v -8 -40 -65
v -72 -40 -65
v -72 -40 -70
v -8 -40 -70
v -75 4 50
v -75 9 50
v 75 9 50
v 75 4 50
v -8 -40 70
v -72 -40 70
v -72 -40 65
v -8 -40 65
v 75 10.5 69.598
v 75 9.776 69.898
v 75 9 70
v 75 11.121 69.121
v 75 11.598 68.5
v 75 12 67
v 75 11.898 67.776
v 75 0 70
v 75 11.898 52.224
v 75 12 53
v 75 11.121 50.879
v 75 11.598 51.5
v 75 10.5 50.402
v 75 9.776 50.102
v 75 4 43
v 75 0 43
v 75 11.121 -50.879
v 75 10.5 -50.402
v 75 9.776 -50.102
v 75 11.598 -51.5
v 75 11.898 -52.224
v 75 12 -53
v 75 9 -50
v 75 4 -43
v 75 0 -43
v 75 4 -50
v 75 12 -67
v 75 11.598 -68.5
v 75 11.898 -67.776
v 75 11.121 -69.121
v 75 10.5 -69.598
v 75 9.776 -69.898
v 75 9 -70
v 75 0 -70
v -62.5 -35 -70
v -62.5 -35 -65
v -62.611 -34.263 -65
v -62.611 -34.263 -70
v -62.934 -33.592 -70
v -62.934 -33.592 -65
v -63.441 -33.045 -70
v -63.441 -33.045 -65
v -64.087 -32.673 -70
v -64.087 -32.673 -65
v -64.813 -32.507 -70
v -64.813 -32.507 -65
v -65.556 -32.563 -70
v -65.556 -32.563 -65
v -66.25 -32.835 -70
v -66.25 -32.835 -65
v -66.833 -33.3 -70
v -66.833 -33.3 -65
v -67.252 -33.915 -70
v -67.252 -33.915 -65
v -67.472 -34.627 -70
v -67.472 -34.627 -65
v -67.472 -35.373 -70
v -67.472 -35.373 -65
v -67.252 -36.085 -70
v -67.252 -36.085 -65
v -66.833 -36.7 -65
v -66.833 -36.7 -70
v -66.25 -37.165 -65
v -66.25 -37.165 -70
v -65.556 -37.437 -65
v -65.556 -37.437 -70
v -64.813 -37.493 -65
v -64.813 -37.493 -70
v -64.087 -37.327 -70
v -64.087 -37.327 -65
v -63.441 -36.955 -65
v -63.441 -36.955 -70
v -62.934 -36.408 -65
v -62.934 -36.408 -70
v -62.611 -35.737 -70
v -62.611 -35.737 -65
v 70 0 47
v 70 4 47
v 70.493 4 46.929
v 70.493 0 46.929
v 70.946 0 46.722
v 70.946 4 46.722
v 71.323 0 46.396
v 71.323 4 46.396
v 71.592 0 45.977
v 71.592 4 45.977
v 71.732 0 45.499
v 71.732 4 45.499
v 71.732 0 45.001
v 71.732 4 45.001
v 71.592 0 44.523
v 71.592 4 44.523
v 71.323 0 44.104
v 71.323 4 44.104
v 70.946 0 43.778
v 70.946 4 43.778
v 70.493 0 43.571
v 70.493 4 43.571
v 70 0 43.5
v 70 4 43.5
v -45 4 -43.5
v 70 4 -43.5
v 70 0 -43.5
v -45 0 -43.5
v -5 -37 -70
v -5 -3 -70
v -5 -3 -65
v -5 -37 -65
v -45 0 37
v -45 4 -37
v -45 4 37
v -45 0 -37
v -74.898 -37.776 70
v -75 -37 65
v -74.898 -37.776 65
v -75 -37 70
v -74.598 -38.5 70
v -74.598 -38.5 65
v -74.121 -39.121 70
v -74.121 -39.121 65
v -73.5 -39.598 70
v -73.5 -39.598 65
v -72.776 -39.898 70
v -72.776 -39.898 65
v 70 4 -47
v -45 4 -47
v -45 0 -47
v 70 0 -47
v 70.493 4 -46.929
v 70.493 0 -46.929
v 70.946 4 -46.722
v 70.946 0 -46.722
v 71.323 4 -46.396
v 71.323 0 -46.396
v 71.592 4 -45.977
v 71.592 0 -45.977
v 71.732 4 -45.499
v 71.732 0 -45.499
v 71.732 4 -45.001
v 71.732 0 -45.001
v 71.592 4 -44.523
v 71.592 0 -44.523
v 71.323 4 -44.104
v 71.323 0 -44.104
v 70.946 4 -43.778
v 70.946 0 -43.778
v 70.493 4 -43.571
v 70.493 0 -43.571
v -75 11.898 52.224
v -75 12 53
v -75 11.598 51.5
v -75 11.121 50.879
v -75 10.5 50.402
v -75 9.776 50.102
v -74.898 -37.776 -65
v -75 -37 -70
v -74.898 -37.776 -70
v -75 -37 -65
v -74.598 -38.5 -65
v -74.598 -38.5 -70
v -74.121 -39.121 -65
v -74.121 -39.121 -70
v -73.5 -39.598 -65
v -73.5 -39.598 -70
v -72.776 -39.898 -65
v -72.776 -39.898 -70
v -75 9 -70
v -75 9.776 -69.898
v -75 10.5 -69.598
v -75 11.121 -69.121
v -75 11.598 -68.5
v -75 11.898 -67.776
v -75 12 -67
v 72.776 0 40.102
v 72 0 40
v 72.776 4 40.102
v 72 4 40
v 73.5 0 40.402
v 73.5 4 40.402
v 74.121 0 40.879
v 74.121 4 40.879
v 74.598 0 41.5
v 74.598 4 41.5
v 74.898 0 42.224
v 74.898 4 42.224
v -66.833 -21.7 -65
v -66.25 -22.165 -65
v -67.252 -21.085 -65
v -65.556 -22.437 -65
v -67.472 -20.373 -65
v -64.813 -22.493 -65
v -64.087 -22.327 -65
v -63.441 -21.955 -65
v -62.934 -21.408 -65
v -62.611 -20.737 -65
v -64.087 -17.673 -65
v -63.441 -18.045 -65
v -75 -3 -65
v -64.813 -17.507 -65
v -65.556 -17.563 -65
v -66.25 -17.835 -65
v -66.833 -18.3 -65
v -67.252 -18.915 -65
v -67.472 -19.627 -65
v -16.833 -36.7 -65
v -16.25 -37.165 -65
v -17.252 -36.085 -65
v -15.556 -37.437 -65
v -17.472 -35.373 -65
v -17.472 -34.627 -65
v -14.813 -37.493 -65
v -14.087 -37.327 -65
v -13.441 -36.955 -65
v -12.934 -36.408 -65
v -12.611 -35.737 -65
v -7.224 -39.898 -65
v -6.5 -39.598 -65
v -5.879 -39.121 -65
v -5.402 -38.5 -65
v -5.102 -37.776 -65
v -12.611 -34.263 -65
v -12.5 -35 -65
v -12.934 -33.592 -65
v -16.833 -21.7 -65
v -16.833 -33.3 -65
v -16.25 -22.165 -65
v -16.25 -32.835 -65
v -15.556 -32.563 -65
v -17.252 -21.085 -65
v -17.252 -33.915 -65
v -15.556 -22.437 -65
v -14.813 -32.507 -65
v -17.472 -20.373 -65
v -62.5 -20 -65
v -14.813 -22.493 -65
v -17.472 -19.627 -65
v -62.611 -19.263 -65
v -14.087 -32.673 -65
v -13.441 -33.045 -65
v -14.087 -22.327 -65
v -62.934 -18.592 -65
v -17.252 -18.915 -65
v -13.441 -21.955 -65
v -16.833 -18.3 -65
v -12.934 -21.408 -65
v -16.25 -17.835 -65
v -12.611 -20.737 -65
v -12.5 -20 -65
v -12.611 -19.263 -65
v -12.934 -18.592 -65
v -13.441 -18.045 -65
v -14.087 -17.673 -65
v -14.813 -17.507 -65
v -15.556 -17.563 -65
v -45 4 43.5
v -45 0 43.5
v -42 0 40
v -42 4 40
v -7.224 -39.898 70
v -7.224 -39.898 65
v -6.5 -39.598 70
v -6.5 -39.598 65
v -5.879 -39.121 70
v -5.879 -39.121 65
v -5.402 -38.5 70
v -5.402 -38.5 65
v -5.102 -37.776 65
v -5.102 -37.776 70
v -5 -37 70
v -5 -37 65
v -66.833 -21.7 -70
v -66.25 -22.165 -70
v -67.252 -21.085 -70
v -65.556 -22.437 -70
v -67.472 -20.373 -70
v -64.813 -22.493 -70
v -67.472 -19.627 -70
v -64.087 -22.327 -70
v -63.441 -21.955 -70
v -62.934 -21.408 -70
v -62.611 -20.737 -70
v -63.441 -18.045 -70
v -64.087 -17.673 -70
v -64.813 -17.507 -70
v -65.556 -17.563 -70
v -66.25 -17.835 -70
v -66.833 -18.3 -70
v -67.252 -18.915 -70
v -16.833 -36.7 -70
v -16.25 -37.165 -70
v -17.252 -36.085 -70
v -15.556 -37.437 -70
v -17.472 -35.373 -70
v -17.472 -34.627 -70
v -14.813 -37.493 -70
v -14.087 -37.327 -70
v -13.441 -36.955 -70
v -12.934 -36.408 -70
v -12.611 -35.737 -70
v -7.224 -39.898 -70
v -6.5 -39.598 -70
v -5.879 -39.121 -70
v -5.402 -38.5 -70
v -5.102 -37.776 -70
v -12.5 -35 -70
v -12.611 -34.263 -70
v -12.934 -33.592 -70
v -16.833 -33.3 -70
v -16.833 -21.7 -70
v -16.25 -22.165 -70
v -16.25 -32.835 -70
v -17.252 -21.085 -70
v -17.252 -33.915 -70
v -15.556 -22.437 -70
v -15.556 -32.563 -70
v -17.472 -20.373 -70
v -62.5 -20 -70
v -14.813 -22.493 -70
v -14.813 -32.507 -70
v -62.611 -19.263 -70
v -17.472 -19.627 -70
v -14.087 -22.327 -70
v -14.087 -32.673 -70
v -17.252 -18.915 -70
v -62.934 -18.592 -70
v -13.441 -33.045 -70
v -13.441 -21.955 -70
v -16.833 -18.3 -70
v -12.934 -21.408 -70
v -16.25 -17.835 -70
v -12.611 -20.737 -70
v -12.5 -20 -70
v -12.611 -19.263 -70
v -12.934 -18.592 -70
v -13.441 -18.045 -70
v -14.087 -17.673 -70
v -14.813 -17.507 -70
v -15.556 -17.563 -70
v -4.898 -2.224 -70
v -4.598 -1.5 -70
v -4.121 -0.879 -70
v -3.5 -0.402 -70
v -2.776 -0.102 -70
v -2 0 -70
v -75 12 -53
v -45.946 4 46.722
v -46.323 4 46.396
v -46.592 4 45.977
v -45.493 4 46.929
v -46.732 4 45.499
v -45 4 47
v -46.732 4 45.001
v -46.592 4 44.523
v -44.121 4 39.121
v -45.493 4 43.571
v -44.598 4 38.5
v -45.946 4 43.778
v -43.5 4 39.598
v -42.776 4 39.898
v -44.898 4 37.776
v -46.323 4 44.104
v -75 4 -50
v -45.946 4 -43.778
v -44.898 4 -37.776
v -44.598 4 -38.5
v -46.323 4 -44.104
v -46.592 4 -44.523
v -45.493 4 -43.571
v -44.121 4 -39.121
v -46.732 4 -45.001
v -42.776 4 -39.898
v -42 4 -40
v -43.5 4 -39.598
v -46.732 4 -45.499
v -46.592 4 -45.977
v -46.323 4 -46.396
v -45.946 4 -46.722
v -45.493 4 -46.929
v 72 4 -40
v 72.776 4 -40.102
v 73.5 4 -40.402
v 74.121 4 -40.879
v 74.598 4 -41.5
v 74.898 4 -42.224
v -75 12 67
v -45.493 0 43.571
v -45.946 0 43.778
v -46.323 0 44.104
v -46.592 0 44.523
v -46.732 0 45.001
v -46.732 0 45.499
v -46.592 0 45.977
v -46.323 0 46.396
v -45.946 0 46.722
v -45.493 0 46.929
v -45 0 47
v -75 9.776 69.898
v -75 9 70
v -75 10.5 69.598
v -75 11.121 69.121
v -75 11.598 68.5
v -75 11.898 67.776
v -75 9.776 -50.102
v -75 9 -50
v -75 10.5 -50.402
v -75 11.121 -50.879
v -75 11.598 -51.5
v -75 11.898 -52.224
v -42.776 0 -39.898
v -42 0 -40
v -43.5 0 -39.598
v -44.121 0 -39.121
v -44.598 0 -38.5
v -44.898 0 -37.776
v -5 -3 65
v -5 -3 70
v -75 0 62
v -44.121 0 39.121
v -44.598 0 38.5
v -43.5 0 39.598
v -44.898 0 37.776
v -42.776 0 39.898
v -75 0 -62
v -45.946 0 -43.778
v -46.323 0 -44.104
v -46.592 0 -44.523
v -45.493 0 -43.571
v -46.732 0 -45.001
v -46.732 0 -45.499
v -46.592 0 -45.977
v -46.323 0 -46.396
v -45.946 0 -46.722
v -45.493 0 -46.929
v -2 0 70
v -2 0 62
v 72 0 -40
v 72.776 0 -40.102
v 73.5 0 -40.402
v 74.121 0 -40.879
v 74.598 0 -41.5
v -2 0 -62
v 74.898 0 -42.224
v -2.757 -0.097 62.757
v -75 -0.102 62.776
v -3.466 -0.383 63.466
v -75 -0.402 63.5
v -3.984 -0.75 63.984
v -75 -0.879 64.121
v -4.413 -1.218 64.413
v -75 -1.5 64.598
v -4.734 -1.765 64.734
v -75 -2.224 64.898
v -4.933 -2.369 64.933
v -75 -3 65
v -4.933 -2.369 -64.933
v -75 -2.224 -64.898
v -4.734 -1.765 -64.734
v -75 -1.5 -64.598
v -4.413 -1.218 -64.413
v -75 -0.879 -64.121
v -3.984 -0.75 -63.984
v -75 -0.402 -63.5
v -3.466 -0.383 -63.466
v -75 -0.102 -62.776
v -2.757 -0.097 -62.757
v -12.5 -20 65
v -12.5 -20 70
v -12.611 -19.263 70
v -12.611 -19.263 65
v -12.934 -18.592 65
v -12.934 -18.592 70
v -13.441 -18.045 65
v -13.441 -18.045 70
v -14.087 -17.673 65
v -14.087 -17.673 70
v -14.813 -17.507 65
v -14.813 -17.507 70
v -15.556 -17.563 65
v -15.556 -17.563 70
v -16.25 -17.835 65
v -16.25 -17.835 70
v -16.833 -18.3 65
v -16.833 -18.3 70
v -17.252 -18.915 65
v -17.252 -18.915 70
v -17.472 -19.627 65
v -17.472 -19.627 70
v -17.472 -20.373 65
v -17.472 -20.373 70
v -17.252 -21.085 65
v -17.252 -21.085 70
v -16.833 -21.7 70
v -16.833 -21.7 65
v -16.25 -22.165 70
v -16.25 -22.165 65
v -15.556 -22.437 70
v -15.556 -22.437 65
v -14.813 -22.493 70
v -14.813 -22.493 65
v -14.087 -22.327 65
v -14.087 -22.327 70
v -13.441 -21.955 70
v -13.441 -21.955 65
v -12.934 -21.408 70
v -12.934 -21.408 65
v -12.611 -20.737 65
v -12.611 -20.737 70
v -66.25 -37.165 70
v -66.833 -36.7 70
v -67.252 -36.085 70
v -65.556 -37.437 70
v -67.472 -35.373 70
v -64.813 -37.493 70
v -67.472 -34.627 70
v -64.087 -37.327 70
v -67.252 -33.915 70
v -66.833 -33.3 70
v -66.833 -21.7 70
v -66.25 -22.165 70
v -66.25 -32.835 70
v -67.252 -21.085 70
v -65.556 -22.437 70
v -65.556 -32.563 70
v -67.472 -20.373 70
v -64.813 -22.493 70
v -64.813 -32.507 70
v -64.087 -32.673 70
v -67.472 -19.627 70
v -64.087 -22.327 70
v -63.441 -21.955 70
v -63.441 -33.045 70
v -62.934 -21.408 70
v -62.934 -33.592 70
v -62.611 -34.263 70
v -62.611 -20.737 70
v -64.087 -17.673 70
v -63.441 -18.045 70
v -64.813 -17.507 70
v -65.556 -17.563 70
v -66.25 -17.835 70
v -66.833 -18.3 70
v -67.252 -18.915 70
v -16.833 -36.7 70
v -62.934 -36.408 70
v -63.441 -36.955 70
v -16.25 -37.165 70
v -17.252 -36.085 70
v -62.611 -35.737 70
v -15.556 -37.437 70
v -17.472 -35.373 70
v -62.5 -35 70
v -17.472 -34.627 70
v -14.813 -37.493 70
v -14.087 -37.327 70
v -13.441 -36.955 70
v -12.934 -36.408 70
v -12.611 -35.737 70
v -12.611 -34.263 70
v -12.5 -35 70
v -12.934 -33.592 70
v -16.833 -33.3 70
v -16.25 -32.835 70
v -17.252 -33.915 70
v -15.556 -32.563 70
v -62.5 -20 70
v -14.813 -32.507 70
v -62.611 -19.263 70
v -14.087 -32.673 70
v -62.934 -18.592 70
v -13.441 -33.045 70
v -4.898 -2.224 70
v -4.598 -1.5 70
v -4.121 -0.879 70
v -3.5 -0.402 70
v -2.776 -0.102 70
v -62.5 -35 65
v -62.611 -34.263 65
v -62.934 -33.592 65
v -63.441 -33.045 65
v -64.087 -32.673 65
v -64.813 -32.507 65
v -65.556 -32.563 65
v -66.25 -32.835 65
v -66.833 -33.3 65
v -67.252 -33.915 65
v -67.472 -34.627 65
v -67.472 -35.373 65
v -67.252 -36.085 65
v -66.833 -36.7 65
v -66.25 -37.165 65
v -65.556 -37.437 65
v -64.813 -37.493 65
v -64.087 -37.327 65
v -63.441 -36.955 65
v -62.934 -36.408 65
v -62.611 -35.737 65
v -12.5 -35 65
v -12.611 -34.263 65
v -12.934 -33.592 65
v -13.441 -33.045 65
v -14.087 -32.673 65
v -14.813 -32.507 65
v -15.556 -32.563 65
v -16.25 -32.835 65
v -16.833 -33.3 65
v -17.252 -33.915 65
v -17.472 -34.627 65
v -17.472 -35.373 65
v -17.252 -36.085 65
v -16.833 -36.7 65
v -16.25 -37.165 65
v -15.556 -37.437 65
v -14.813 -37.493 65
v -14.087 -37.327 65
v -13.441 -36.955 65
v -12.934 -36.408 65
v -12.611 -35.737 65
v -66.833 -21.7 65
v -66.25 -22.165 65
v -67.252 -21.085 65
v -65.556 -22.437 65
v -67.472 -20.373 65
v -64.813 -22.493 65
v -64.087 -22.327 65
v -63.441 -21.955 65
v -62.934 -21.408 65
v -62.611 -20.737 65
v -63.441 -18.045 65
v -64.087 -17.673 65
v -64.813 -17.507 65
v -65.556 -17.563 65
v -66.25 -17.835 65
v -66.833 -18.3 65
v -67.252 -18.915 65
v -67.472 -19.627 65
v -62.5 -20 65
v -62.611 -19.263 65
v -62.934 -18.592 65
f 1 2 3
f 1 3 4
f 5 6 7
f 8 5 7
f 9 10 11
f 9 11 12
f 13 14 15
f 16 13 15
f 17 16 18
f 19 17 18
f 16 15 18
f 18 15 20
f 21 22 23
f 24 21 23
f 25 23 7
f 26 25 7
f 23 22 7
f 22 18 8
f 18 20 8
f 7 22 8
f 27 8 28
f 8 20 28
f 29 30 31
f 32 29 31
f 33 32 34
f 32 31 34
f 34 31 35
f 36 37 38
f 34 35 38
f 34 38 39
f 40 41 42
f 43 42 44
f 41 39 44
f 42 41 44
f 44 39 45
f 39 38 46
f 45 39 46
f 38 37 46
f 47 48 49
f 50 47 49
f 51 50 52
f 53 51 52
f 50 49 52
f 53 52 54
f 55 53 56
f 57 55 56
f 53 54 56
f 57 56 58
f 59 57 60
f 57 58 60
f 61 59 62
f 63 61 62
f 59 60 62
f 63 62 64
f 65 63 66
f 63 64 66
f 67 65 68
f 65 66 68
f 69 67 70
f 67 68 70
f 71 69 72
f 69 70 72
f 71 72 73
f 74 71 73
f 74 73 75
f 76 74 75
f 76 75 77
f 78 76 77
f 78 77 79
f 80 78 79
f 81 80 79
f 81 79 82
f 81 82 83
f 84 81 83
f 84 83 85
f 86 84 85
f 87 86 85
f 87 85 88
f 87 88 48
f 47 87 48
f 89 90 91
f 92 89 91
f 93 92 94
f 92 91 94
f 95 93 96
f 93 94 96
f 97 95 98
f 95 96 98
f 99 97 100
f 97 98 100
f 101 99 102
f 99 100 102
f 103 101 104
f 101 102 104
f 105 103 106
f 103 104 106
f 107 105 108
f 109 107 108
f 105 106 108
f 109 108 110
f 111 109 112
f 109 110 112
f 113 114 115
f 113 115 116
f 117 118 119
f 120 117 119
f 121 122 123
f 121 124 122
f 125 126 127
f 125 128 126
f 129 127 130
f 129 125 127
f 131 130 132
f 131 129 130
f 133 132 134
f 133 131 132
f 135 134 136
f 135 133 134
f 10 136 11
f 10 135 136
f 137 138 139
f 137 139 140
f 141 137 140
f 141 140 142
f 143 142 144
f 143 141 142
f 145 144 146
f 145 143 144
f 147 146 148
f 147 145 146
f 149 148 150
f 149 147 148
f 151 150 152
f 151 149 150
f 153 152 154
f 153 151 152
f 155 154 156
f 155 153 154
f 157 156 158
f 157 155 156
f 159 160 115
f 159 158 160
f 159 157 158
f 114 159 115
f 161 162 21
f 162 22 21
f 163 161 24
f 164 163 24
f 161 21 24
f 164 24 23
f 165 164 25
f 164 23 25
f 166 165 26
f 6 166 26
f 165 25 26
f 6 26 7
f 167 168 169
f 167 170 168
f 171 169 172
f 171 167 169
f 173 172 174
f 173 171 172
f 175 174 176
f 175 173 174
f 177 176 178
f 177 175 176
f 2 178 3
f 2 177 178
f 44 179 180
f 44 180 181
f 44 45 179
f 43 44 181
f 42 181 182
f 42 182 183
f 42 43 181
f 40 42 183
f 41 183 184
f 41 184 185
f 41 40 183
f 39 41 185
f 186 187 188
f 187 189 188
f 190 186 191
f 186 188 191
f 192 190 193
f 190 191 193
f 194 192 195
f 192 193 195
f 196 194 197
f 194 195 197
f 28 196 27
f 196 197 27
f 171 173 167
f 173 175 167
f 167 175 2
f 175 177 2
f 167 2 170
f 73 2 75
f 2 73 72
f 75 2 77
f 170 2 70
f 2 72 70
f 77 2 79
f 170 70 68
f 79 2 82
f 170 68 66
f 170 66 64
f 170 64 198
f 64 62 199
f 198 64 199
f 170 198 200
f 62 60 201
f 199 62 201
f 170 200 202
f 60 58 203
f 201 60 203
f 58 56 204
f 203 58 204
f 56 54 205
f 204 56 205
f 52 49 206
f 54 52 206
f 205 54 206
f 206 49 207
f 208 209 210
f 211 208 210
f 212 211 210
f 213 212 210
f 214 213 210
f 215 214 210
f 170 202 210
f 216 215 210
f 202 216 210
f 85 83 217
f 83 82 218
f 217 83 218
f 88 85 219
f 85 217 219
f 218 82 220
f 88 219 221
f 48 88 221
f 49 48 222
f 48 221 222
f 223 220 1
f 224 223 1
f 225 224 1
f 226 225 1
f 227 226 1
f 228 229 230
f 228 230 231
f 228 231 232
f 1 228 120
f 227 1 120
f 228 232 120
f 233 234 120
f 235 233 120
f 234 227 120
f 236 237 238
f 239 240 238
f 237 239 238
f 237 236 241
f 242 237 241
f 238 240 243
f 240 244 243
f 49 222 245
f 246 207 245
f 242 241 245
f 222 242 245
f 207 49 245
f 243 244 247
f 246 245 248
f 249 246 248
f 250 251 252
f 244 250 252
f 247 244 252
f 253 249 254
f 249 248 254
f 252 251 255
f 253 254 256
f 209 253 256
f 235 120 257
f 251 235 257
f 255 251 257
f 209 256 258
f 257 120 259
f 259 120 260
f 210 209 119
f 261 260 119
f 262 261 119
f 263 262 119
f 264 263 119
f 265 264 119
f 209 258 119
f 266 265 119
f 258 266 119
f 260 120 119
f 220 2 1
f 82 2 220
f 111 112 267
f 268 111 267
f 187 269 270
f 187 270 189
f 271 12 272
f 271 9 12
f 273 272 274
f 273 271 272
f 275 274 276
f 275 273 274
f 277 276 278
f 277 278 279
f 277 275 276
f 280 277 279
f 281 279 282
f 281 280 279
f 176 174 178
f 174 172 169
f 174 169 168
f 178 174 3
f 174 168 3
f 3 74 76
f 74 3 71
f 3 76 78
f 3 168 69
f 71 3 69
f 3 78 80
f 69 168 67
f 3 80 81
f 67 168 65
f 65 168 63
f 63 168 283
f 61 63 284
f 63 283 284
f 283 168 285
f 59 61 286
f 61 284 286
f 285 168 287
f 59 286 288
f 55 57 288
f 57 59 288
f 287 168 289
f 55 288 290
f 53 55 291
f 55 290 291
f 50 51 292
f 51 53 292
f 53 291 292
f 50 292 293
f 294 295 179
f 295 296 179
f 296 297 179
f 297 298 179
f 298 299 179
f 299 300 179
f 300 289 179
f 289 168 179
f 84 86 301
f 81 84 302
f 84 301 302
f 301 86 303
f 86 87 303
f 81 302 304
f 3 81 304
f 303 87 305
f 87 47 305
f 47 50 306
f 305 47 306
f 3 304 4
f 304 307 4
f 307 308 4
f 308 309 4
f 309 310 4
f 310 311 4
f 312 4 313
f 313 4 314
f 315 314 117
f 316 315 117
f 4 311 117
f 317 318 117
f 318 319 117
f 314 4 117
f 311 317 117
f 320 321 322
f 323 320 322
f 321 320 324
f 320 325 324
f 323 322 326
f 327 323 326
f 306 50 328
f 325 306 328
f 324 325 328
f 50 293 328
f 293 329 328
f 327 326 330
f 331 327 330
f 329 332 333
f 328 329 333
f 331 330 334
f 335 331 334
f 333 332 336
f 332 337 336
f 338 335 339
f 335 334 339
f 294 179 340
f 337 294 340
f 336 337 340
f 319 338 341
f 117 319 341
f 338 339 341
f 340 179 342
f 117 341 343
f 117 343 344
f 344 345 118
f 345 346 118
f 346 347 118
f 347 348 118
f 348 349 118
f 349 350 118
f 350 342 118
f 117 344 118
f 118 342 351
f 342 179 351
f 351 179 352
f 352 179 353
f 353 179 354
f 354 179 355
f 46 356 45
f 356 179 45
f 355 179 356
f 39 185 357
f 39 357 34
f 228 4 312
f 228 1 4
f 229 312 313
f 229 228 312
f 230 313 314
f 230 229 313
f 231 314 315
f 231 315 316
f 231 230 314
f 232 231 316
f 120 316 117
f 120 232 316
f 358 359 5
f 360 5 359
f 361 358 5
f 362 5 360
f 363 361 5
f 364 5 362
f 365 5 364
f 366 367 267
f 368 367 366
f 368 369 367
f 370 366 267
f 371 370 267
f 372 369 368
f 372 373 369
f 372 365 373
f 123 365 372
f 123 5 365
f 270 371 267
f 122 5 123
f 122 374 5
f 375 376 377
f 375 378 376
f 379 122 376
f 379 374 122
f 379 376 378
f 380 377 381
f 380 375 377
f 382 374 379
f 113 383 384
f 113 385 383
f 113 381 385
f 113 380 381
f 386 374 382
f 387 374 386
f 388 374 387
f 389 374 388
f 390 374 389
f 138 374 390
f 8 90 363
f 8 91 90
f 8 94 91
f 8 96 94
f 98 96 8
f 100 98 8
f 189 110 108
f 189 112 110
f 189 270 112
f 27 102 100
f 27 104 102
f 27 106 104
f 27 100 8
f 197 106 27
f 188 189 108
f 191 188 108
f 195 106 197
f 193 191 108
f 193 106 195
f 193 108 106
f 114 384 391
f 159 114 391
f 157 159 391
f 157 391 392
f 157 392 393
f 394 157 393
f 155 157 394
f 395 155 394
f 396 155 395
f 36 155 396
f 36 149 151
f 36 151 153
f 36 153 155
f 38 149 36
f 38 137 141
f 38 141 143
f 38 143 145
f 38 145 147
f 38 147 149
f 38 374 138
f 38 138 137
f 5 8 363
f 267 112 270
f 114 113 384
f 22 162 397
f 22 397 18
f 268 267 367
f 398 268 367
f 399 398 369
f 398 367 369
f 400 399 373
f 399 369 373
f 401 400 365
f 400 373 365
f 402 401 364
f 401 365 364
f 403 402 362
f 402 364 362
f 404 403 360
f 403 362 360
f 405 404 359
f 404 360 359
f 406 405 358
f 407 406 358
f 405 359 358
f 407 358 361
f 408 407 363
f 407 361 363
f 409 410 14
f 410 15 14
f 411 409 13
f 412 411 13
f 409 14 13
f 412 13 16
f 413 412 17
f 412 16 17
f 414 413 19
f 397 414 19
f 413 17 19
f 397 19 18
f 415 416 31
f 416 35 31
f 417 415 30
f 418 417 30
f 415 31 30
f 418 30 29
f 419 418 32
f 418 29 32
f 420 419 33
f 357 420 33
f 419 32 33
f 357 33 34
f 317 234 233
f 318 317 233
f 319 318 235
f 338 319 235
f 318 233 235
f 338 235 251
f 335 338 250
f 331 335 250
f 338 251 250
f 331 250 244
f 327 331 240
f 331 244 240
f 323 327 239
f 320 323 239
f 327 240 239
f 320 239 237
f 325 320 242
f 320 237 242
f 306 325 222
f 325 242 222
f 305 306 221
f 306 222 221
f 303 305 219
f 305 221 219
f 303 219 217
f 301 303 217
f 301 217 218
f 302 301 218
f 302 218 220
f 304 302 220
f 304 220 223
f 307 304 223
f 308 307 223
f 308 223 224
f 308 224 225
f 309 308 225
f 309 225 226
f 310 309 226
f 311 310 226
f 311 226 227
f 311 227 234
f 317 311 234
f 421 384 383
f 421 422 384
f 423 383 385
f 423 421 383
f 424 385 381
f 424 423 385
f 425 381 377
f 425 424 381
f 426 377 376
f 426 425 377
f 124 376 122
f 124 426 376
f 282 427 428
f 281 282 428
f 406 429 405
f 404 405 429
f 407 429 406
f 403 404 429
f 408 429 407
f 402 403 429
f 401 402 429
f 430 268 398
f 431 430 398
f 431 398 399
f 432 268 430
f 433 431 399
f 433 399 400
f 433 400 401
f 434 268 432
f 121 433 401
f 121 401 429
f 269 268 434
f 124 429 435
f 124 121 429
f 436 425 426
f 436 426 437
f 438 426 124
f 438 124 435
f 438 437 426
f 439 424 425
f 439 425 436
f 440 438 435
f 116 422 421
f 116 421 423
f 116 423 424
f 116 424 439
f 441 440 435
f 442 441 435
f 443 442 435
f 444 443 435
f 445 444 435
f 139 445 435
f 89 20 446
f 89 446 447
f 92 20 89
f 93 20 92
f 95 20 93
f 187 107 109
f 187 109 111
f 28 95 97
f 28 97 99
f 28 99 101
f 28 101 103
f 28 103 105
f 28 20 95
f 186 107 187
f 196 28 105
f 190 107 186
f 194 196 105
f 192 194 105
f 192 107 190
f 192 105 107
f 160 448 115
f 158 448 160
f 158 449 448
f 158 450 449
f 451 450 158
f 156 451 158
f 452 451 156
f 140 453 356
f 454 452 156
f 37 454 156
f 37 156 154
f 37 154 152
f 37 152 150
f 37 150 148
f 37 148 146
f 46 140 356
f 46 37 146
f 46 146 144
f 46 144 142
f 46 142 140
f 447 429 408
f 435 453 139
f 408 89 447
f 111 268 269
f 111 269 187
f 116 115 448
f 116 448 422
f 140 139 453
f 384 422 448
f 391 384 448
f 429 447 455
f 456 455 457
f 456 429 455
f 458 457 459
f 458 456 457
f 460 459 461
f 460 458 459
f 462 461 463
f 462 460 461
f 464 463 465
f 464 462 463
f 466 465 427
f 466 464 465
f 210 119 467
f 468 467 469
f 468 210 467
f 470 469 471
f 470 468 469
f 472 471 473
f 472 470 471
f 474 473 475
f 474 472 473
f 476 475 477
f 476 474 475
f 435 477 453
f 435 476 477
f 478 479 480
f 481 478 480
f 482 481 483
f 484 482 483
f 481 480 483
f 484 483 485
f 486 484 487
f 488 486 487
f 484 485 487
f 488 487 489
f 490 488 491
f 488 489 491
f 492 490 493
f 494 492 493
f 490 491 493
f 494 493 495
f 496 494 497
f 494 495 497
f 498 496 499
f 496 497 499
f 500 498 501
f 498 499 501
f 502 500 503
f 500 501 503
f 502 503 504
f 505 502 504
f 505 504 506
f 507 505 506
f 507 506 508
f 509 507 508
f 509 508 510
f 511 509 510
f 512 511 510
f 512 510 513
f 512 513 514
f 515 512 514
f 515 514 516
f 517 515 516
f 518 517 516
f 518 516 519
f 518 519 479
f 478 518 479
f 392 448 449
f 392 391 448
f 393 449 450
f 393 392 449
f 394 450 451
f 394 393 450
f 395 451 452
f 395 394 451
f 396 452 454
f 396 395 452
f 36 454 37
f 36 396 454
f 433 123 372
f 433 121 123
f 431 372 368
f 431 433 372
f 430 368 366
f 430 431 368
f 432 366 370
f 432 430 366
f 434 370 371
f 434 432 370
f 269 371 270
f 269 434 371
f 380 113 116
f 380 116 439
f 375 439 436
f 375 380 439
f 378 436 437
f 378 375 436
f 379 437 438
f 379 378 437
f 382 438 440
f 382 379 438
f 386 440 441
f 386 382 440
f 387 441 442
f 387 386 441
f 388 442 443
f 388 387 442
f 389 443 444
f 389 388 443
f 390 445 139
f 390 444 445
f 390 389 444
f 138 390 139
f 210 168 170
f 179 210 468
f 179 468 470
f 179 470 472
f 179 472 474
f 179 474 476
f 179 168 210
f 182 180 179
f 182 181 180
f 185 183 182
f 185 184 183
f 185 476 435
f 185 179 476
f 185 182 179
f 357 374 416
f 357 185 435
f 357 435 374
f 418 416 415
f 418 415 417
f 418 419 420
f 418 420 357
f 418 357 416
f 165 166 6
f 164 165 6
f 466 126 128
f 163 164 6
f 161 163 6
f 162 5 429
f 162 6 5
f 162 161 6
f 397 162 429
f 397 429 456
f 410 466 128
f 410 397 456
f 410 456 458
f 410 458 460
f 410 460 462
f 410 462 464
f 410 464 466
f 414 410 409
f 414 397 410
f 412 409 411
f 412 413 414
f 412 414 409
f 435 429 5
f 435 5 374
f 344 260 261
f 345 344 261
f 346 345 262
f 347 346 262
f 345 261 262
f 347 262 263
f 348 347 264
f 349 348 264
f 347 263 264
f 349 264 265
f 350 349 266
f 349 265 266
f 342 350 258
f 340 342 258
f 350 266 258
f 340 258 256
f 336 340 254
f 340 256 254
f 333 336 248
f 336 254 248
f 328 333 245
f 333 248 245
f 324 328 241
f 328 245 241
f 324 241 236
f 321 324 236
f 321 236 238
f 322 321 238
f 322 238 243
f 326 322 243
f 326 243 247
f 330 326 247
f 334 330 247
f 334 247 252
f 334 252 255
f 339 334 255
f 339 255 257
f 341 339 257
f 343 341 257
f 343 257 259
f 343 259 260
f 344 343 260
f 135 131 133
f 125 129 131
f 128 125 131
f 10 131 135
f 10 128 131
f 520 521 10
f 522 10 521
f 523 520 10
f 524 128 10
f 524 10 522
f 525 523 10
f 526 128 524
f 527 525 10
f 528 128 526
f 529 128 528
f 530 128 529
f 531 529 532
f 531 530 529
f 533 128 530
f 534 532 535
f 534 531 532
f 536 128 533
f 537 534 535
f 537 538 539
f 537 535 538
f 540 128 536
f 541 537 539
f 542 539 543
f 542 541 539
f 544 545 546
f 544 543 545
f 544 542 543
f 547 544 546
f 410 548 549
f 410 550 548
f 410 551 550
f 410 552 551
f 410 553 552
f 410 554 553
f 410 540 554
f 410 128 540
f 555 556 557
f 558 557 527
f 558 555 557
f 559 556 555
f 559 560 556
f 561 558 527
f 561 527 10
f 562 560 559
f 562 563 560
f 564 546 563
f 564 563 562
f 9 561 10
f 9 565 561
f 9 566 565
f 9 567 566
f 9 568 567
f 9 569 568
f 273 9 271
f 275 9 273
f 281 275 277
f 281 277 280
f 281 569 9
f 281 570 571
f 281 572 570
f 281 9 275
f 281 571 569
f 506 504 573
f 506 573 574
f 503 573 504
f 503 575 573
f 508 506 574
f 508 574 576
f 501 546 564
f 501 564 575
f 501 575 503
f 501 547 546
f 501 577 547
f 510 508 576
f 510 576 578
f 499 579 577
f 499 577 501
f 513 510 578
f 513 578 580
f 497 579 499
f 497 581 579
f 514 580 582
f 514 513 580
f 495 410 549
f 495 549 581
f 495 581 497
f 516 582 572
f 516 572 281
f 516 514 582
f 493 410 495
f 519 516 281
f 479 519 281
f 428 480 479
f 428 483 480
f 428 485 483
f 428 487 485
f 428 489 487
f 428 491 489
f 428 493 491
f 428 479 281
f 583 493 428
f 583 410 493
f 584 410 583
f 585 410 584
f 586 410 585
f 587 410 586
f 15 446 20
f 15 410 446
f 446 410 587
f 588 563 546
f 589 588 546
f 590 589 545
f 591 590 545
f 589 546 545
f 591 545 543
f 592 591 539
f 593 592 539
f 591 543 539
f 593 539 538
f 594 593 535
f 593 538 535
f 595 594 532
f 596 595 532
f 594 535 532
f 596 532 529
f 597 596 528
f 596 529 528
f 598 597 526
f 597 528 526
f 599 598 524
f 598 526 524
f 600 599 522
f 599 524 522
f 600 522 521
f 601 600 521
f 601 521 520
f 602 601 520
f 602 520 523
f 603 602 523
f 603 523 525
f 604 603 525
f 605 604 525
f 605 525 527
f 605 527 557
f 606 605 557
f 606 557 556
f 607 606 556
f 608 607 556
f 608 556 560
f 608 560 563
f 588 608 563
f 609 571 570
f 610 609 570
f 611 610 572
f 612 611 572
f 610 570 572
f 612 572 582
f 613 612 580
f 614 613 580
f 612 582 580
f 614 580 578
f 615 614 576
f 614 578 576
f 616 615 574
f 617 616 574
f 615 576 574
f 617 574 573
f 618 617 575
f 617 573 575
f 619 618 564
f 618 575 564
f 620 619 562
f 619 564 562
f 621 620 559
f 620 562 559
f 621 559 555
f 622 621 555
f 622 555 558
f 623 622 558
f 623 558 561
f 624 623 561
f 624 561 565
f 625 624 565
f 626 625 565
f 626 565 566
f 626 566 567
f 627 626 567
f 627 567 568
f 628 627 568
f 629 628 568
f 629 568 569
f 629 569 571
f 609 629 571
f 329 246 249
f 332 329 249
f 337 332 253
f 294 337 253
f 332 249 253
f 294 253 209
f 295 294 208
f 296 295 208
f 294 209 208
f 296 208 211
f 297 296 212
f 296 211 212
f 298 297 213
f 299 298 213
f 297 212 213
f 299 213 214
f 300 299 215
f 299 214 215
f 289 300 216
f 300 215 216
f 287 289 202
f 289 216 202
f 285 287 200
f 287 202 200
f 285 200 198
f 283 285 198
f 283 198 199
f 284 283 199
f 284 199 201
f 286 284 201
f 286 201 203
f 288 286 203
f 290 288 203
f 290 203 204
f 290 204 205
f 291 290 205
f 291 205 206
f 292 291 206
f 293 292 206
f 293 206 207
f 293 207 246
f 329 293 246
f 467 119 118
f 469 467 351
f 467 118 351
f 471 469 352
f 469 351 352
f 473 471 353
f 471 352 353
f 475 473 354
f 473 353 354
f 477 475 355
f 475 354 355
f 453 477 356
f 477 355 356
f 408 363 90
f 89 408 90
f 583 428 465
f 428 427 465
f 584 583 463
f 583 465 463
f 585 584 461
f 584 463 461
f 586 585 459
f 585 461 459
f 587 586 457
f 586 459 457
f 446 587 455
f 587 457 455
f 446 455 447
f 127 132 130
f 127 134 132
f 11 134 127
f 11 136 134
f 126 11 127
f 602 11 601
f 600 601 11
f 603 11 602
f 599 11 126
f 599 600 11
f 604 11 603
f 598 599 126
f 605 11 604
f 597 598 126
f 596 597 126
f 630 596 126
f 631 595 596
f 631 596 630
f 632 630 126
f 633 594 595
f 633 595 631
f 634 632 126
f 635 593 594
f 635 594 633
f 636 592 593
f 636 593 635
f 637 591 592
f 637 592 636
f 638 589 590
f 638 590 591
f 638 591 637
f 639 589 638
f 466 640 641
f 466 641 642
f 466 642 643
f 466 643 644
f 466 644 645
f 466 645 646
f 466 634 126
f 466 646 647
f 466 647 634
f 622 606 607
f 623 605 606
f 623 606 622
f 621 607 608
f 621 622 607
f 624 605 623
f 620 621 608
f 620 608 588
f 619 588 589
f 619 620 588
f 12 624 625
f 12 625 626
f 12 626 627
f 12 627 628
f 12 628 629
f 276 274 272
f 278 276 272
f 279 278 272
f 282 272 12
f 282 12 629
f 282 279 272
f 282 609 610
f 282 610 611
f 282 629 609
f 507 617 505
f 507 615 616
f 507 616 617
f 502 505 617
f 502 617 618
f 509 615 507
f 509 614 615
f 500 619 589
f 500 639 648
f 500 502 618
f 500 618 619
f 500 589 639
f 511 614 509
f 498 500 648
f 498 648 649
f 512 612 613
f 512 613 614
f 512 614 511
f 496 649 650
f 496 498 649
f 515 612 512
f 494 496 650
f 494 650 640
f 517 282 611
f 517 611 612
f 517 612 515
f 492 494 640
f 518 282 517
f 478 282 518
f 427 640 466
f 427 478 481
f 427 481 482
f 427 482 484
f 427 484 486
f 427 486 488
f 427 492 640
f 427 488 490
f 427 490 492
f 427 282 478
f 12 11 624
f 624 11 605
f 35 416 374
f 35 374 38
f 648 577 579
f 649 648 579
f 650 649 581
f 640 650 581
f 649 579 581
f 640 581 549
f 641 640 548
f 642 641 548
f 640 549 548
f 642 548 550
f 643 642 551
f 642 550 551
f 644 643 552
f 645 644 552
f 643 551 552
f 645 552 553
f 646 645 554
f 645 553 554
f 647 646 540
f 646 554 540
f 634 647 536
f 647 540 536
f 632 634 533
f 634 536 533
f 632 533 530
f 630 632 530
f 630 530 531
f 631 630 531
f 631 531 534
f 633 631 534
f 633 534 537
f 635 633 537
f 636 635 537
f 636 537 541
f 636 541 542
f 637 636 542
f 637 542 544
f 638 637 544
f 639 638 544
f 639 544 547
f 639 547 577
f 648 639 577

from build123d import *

# Parameters (mm, degrees)
SKETCH1_W               = 150
SKETCH1_H               = 140
BOSS_EXTRUDE1_DEPTH     = 12
SKETCH4_W               = 70
SKETCH4_H               = 140
BOSS_EXTRUDE2_DEPTH     = 40
SKETCH5_R               = 2.5
CUT_EXTRUDE1_DEPTH      = 141
SKETCH7_W               = 150
SKETCH7_H               = 100
CUT_EXTRUDE2_DEPTH      = 8
SKETCH8_W               = 120
SKETCH8_H               = 80
CUT_EXTRUDE3_DEPTH      = 41
CUT_EXTRUDE3_DEPTH_BACK = 13
CUT_EXTRUDE4_DEPTH      = 45
SKETCH11_W              = 130
SKETCH11_H              = 40
CUT_EXTRUDE6_DEPTH      = 71
FILLET5_R               = 3
FILLET6_R               = 3
FILLET7_R               = 3
FILLET8_R               = 3
FILLET9_R               = 3
FILLET10_R              = 3
FILLET11_R              = 3


with BuildPart() as part:
    # Sketch1 → Boss-Extrude1 (new body)
    with BuildSketch(Plane(origin=(0, 0, 0), x_dir=(1, 0, 0), z_dir=(0, 1, 0))):
        Rectangle(SKETCH1_W, SKETCH1_H)
    extrude(amount=BOSS_EXTRUDE1_DEPTH)

    # Sketch4 → Boss-Extrude2 (add)
    with BuildSketch(Plane.XZ):
        with Locations((-40, 0)):
            Rectangle(SKETCH4_W, SKETCH4_H)
    extrude(amount=BOSS_EXTRUDE2_DEPTH)

    # Sketch5 → Cut-Extrude1 (cut, through all)
    with BuildSketch(Plane.XY.offset(70)):
        with Locations((-65, -35)):
            Circle(SKETCH5_R)
        with Locations((-15, -35)):
            Circle(SKETCH5_R)
        with Locations((-15, -20)):
            Circle(SKETCH5_R)
        with Locations((-65, -20)):
            Circle(SKETCH5_R)
    extrude(amount=-CUT_EXTRUDE1_DEPTH, mode=Mode.SUBTRACT)

    # Sketch7 → Cut-Extrude2 (cut)
    with BuildSketch(Plane(origin=(0, 12, 0), x_dir=(1, 0, 0), z_dir=(0, 1, 0))):
        Rectangle(SKETCH7_W, SKETCH7_H)
    extrude(amount=-CUT_EXTRUDE2_DEPTH, mode=Mode.SUBTRACT)

    # Sketch8 → Cut-Extrude3 (cut, two sides)
    with BuildSketch(Plane.XZ) as cut_extrude3_sk:
        with Locations((15, 0)):
            Rectangle(SKETCH8_W, SKETCH8_H)
    extrude(amount=CUT_EXTRUDE3_DEPTH, mode=Mode.SUBTRACT)
    extrude(cut_extrude3_sk.sketch, amount=-CUT_EXTRUDE3_DEPTH_BACK, mode=Mode.SUBTRACT)

    # Sketch9 → Cut-Extrude4 (cut, through all)
    with BuildSketch(Plane(origin=(0, 4, 0), x_dir=(1, 0, 0), z_dir=(0, 1, 0))):
        with BuildLine():
            Line((-45, 47), (70, 47))
            ThreePointArc((70, 47), (71.75, 45.25), (70, 43.5))
            Line((70, 43.5), (-45, 43.5))
            ThreePointArc((-45, 43.5), (-46.75, 45.25), (-45, 47))
        make_face()
        with BuildLine():
            Line((-45, -47), (70, -47))
            ThreePointArc((70, -47), (71.75, -45.25), (70, -43.5))
            Line((70, -43.5), (-45, -43.5))
            ThreePointArc((-45, -43.5), (-46.75, -45.25), (-45, -47))
        make_face()
    extrude(amount=-CUT_EXTRUDE4_DEPTH, mode=Mode.SUBTRACT)

    # Sketch11 → Cut-Extrude6 (cut, through all)
    with BuildSketch(Plane(origin=(-5, 0, 0), x_dir=(0, 0, -1), z_dir=(1, 0, 0))):
        with Locations((0, -20)):
            Rectangle(SKETCH11_W, SKETCH11_H)
    extrude(amount=-CUT_EXTRUDE6_DEPTH, mode=Mode.SUBTRACT)

    # Fillet5
    fillet5_edges = [part.edges().sort_by_distance(p)[0] for p in [
        (-40, 0, -65),
        (-40, 0, 65),
    ]]
    fillet(fillet5_edges, radius=FILLET5_R)

    # Fillet6
    fillet6_edges = [part.edges().sort_by_distance(p)[0] for p in [
        (-5, 0, -67.5),
        (-5, 0, 67.5),
    ]]
    fillet(fillet6_edges, radius=FILLET6_R)

    # Fillet7
    fillet7_edges = [part.edges().sort_by_distance(p)[0] for p in [
        (0, 12, 70),
        (0, 12, -70),
    ]]
    fillet(fillet7_edges, radius=FILLET7_R)

    # Fillet8
    fillet8_edges = [part.edges().sort_by_distance(p)[0] for p in [
        (0, 12, -50),
        (0, 12, 50),
    ]]
    fillet(fillet8_edges, radius=FILLET8_R)

    # Fillet9
    fillet9_edges = [part.edges().sort_by_distance(p)[0] for p in [
        (-5, -40, 67.5),
        (-75, -40, -67.5),
        (-75, -40, 67.5),
        (-5, -40, -67.5),
    ]]
    fillet(fillet9_edges, radius=FILLET9_R)

    # Fillet10
    fillet10_edges = [part.edges().sort_by_distance(p)[0] for p in [
        (-45, 2, 40),
        (-45, 2, -40),
    ]]
    fillet(fillet10_edges, radius=FILLET10_R)

    # Fillet11
    fillet11_edges = [part.edges().sort_by_distance(p)[0] for p in [
        (75, 2, 40),
        (75, 2, -40),
    ]]
    fillet(fillet11_edges, radius=FILLET11_R)


solid = part.part
